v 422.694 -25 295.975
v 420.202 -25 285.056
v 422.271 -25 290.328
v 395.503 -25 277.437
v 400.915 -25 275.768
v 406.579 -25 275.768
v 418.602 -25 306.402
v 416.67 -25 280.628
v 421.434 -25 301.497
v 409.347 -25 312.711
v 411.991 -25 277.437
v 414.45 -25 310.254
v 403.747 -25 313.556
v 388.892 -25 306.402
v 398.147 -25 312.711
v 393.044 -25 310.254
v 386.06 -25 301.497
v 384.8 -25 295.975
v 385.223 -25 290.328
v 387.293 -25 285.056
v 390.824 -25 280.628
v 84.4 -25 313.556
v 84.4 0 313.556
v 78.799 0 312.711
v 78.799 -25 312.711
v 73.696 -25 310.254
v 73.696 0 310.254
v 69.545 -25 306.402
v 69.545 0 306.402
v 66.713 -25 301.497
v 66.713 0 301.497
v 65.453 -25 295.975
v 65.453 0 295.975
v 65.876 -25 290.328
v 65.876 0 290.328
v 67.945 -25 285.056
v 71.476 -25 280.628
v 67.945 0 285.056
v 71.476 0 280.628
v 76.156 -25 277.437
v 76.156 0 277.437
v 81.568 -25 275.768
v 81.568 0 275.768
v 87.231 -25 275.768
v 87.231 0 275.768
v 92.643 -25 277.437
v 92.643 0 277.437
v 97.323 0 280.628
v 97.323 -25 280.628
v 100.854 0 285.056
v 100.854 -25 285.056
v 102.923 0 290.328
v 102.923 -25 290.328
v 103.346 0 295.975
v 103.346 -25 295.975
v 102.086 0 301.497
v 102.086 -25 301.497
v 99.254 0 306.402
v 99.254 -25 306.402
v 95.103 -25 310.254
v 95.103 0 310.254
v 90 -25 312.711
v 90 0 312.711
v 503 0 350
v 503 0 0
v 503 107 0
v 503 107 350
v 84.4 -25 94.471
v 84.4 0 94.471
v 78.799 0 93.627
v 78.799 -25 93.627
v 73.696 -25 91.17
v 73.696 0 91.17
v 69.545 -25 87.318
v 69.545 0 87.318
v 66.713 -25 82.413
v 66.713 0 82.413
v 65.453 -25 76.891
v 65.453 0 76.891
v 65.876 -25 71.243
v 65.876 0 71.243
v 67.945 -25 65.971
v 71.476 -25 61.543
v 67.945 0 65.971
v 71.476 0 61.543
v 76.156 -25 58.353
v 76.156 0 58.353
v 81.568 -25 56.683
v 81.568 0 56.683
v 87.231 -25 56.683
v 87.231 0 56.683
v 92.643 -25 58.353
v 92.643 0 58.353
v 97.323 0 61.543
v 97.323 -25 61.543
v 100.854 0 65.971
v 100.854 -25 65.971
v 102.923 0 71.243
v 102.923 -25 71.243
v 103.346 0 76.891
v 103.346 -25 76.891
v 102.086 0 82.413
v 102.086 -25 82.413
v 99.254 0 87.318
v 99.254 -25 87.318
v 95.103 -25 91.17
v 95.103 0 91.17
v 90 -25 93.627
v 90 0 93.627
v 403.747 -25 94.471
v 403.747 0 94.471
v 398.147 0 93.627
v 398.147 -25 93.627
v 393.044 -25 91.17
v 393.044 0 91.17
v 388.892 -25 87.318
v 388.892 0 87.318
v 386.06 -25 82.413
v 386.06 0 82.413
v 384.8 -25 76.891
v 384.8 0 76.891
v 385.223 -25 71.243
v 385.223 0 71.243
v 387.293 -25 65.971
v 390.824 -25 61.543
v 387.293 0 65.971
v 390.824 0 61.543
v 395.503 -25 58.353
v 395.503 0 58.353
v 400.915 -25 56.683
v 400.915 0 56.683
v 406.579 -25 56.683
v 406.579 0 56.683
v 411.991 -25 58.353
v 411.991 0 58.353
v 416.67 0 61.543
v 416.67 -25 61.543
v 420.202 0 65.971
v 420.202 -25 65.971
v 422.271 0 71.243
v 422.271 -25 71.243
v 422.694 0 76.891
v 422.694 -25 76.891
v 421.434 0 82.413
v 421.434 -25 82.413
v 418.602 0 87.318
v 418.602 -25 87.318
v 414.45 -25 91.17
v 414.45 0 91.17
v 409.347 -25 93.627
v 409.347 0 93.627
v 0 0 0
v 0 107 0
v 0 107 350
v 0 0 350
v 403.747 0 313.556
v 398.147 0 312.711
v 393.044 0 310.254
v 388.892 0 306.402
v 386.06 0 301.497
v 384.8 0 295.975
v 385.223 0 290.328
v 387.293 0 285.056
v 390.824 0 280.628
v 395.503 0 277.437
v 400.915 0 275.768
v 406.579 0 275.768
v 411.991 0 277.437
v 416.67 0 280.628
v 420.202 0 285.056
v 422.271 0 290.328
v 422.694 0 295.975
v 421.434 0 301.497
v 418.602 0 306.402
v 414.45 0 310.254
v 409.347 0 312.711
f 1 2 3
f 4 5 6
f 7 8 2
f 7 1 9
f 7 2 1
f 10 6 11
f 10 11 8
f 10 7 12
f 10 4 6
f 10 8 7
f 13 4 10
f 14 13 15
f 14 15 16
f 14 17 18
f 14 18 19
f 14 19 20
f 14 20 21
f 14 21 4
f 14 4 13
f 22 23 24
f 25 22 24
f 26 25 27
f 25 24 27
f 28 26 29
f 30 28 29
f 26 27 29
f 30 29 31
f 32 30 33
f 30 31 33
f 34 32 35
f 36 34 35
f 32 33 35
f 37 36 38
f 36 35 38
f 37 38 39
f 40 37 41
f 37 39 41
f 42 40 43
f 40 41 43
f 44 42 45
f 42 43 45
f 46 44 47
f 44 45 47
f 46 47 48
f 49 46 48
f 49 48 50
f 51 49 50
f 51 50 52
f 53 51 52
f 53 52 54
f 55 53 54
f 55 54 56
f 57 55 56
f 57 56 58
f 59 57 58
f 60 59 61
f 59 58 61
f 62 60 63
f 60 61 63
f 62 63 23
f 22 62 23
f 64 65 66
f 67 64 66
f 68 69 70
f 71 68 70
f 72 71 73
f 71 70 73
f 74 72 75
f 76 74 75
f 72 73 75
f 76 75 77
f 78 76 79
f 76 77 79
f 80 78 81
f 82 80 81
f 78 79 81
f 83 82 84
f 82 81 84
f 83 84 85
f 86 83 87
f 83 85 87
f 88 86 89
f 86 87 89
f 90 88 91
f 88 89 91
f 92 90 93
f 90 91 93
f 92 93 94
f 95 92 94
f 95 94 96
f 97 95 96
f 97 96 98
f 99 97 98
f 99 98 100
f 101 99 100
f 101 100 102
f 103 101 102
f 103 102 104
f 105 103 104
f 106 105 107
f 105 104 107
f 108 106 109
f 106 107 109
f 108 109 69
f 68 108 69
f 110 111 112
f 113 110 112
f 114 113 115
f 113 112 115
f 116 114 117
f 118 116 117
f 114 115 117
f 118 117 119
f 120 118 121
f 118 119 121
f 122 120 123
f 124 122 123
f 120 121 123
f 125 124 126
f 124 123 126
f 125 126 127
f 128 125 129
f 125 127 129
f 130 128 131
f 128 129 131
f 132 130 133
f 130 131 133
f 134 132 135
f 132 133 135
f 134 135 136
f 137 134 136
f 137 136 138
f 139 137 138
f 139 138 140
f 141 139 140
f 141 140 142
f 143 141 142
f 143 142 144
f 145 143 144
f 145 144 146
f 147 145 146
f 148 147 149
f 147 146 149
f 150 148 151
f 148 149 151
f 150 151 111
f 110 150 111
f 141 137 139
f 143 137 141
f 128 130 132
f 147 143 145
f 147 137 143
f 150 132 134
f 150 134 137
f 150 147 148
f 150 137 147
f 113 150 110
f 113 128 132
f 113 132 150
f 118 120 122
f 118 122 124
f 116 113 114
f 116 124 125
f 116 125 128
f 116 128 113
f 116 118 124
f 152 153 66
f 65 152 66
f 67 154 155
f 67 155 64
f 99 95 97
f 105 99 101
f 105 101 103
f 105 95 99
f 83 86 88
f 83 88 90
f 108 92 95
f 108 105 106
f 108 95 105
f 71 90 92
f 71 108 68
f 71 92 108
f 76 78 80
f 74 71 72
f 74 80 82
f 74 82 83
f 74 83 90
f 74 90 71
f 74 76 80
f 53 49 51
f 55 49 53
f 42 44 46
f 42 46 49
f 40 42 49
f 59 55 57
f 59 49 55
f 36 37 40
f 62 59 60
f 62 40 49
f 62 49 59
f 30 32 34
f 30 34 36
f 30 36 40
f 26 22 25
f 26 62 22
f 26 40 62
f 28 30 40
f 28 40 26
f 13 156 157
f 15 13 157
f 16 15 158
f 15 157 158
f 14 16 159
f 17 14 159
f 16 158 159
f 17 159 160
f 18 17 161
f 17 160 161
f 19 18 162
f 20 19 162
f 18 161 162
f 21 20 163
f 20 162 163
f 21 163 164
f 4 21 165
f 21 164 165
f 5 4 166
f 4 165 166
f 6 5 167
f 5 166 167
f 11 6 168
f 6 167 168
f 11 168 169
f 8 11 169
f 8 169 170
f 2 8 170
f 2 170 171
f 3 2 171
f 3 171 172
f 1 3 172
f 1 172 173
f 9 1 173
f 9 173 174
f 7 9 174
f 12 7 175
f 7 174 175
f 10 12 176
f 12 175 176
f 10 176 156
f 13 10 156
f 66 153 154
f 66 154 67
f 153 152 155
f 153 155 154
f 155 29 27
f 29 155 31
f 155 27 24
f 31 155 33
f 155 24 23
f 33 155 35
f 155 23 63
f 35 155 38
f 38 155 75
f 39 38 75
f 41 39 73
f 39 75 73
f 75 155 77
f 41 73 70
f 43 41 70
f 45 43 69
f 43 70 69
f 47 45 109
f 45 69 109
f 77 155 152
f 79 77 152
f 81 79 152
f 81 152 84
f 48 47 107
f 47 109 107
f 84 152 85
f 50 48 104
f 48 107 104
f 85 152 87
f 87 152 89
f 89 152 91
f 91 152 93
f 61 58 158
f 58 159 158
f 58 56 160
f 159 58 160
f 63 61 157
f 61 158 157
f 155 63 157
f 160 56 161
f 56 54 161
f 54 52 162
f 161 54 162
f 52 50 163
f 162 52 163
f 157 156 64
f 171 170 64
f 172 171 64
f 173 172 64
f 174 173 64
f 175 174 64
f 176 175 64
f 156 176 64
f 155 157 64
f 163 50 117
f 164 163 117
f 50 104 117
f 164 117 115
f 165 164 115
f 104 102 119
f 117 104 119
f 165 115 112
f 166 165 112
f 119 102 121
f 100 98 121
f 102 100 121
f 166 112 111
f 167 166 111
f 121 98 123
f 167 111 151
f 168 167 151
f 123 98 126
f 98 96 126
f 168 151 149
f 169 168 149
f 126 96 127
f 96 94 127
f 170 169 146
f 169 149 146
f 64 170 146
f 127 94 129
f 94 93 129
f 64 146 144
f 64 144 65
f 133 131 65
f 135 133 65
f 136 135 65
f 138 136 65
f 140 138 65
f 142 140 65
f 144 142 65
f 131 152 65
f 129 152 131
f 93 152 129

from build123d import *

# Parameters (mm, degrees)
SKIZZE1_W                       = 503
SKIZZE1_H                       = 107
AUFSATZ_LINEAR_AUSTRAGEN1_DEPTH = 350
SKIZZE2_R                       = 19
AUFSATZ_LINEAR_AUSTRAGEN2_DEPTH = 25


with BuildPart() as part:
    # Skizze1 → Aufsatz-Linear austragen1 (new body)
    with BuildSketch(Plane.XY):
        with Locations((251.5, 53.5)):
            Rectangle(SKIZZE1_W, SKIZZE1_H)
    extrude(amount=AUFSATZ_LINEAR_AUSTRAGEN1_DEPTH)

    # Skizze2 → Aufsatz-Linear austragen2 (add)
    with BuildSketch(Plane.XZ):
        with Locations(Location((84.399565915, 294.555551984, 0), (0, 0, 90))):
            Circle(SKIZZE2_R)
        with Locations(Location((403.747062166, 294.555551984, 0), (0, 0, 90))):
            Circle(SKIZZE2_R)
        with Locations(Location((403.747062166, 75.47123017, 0), (0, 0, 90))):
            Circle(SKIZZE2_R)
        with Locations(Location((84.399565915, 75.47123017, 0), (0, 0, 90))):
            Circle(SKIZZE2_R)
    extrude(amount=AUFSATZ_LINEAR_AUSTRAGEN2_DEPTH)


solid = part.part
